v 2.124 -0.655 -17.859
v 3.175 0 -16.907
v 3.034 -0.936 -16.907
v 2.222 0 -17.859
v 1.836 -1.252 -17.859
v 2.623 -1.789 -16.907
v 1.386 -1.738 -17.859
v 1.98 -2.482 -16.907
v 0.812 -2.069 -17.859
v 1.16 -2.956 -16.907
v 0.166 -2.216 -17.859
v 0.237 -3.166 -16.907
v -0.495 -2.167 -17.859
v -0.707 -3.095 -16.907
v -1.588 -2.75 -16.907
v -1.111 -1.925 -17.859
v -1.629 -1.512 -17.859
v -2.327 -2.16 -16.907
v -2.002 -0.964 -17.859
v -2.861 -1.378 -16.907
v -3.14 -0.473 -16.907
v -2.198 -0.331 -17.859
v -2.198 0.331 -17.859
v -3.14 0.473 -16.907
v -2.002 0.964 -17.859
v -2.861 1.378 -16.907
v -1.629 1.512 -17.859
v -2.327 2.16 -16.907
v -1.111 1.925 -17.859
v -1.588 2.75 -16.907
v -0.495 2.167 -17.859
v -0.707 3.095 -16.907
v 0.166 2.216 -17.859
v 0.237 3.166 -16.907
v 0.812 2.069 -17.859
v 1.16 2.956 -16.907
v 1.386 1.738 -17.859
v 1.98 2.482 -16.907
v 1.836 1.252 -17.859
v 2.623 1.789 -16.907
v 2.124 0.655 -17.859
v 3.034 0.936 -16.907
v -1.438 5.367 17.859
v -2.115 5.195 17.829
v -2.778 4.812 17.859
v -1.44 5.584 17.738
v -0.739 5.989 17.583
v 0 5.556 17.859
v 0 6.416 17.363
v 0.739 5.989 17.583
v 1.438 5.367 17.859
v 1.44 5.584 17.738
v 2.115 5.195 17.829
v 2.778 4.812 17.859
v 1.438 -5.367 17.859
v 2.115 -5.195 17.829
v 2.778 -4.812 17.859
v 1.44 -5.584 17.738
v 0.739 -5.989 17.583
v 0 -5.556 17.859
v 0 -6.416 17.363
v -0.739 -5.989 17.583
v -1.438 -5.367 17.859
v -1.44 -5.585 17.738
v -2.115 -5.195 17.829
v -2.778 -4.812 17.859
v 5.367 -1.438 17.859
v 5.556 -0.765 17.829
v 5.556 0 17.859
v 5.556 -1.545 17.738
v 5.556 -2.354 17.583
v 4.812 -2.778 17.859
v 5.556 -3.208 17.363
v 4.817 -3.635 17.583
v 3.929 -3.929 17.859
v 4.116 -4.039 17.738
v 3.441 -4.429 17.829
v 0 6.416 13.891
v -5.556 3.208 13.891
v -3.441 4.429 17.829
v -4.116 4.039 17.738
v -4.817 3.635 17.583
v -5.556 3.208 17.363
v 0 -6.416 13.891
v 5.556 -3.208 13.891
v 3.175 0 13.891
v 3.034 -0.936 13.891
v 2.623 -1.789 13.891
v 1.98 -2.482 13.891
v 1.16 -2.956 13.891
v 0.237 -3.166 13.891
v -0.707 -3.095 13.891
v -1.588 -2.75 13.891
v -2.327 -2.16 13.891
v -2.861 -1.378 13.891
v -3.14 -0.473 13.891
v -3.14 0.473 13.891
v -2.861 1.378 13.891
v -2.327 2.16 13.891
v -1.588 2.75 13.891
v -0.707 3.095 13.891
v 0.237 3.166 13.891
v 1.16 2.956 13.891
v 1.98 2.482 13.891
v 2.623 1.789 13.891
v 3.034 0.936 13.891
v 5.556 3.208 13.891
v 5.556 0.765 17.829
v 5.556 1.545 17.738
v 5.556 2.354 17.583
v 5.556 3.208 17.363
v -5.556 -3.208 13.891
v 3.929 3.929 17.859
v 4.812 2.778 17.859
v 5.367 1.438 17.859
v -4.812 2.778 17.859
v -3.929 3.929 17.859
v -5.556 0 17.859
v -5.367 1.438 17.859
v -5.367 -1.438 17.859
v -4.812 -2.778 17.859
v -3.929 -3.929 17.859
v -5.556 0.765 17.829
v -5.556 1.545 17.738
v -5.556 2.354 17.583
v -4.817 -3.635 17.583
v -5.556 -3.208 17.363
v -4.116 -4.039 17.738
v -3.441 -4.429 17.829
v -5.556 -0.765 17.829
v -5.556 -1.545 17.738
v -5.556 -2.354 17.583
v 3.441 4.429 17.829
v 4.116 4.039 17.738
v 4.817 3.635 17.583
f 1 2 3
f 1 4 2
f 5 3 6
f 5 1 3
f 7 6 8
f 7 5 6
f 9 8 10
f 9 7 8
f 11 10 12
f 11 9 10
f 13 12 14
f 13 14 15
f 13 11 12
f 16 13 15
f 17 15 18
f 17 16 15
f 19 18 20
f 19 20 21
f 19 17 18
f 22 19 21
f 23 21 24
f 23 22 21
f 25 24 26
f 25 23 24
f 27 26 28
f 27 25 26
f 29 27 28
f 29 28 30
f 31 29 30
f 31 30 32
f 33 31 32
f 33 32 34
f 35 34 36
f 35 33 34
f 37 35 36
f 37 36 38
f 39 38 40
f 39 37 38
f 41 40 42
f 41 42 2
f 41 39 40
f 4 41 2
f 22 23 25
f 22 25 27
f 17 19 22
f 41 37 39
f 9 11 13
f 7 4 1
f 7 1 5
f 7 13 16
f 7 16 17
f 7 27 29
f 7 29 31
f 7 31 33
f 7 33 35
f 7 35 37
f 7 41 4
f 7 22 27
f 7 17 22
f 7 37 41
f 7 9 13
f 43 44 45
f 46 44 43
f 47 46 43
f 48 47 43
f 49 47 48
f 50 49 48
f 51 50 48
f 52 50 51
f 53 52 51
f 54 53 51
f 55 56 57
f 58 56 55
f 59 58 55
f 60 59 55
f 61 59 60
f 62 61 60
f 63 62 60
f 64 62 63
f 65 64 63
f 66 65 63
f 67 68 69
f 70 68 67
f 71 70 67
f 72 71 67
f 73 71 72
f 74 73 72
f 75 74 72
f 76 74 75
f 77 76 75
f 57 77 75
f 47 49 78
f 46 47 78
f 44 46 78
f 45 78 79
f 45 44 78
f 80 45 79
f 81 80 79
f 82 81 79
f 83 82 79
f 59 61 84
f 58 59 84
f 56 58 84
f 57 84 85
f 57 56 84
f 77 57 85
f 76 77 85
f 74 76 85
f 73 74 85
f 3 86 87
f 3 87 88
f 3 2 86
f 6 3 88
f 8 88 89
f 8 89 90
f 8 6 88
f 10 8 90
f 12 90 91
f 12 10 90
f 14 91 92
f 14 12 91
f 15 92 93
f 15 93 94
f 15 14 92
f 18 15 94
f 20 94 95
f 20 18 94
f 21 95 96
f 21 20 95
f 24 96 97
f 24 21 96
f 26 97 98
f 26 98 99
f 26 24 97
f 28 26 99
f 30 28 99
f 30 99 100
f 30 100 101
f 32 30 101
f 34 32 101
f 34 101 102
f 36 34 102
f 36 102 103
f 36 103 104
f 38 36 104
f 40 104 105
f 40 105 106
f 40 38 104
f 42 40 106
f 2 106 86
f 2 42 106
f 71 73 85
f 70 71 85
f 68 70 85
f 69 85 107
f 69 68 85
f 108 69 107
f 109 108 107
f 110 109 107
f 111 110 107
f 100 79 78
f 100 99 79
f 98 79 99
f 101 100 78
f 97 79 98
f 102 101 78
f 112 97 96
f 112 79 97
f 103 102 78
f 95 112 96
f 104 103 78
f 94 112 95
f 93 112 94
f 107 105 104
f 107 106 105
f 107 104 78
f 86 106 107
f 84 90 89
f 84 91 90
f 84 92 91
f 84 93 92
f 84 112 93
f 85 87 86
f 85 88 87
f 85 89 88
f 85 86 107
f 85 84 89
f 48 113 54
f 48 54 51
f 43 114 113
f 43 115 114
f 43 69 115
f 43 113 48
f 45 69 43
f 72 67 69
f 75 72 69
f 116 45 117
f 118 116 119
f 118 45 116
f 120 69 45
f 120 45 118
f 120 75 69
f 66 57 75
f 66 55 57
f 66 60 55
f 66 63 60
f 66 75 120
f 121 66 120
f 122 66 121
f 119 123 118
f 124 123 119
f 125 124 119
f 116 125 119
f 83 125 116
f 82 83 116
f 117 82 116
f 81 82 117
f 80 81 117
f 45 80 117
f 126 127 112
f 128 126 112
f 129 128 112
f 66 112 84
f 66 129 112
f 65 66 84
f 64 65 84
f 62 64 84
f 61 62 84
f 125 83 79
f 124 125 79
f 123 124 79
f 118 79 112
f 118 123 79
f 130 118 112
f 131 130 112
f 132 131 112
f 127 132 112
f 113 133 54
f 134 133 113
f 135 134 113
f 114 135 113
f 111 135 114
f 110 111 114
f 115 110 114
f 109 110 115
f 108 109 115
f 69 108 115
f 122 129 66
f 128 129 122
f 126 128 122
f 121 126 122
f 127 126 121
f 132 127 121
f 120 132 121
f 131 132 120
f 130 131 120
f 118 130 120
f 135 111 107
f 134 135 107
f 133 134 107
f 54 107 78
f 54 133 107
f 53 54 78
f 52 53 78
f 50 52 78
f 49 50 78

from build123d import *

# Parameters (mm, degrees)
SKETCH4_OUTSIDE_W  = 22.844
SKETCH4_OUTSIDE_H  = 22.844
CUT_EXTRUDE1_DEPTH = 37.85314377


with BuildPart() as part:
    # Sketch3 → Revolve1 (revolve)
    with BuildSketch(Plane(origin=(0, 0, 0), x_dir=(0, 0, -1), z_dir=(1, 0, 0))):
        Polygon((17.859375, 2.2225), (17.859375, 0), (-17.859375, 0), (-17.859375, 5.55625), (-17.363110767, 6.415804866), (-13.890625, 6.415804866), (-13.890625, 3.175), (16.906875, 3.175), align=None)
    revolve(axis=Axis((0, 0, 17.859375), (0, 0, -1)))

    # Sketch4 outside → Cut-Extrude1 (cut, through all)
    with BuildSketch(Plane.XY.offset(17.859375)):
        Rectangle(SKETCH4_OUTSIDE_W, SKETCH4_OUTSIDE_H)
        Polygon((5.55625, -3.207902433), (5.55625, 3.207902433), (0, 6.415804866), (-5.55625, 3.207902433), (-5.55625, -3.207902433), (0, -6.415804866), align=None, mode=Mode.SUBTRACT)
    extrude(amount=-CUT_EXTRUDE1_DEPTH, mode=Mode.SUBTRACT)


solid = part.part
